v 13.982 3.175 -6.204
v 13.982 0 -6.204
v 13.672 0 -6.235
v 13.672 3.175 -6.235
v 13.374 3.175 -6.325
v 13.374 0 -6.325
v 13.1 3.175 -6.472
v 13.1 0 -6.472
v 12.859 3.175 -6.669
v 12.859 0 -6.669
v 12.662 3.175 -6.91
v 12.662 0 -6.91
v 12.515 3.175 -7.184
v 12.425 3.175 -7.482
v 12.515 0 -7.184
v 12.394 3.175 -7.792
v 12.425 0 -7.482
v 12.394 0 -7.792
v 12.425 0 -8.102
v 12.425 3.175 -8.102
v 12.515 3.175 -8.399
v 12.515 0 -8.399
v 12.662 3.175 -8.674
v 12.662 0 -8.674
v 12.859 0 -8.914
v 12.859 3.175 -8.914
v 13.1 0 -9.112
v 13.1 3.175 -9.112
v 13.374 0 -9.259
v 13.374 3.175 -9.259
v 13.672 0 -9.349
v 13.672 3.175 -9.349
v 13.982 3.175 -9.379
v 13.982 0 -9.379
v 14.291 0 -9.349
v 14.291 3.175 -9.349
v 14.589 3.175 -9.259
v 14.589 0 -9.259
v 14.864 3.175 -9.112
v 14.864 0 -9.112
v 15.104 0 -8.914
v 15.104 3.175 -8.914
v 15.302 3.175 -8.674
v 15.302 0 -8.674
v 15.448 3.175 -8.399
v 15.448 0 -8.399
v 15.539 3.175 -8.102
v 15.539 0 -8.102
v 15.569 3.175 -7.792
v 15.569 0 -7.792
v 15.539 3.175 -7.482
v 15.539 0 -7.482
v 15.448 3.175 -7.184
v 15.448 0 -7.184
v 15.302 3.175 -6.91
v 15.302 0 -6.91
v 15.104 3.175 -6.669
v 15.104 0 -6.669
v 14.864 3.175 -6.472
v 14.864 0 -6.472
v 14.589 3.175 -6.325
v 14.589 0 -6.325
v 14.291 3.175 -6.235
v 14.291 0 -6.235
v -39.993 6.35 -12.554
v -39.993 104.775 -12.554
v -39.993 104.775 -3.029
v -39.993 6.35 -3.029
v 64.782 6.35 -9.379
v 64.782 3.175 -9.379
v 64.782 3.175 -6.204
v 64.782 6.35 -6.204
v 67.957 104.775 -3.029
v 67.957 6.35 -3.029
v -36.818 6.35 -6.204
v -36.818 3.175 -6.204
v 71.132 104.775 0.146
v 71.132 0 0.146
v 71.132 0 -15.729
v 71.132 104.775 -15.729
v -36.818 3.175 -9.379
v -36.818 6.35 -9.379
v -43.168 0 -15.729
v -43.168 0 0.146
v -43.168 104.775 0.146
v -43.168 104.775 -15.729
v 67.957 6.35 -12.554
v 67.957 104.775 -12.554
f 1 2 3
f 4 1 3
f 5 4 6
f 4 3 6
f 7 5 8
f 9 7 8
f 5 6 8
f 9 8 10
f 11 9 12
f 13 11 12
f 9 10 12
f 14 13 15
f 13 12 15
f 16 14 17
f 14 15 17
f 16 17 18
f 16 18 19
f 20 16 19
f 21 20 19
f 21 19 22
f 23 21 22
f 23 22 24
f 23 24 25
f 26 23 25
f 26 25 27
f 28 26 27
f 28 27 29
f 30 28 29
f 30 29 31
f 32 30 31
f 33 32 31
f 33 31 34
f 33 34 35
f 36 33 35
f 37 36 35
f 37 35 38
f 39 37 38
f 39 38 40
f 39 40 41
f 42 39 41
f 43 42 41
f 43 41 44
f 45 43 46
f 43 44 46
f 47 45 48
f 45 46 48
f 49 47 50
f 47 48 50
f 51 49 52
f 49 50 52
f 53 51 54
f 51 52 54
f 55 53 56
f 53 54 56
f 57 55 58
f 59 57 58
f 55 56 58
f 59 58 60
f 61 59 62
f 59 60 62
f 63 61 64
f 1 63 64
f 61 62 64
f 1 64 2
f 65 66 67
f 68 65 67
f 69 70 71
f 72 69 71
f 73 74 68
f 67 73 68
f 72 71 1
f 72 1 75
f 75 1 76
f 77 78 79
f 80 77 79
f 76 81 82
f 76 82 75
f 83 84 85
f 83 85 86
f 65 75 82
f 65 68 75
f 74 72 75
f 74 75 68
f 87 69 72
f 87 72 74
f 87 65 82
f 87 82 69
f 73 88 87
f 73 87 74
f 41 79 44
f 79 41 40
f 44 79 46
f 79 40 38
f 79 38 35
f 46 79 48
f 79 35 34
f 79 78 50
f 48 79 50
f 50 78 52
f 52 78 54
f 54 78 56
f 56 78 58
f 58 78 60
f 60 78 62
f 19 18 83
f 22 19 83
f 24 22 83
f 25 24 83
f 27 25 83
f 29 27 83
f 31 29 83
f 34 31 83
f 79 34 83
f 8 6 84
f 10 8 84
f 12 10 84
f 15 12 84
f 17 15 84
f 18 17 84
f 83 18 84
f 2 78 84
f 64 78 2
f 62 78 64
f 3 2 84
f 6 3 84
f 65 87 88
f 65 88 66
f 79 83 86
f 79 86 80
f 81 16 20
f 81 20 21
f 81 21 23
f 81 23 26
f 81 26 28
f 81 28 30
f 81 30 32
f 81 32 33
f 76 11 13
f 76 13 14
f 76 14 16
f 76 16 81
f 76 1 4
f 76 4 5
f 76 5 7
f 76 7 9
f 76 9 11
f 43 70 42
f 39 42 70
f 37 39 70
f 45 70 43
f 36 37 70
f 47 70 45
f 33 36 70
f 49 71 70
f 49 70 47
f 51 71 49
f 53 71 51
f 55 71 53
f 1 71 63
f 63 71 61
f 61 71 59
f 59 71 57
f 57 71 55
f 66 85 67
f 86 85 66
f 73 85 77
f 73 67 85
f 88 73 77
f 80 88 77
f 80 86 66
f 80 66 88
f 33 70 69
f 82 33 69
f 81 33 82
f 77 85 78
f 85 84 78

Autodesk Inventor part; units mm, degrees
ref_plane "YZ Plane" through (0, 0, 0) normal (1, 0, 0) x (0, 1, 0)
ref_plane "XZ Plane" through (0, 0, 0) normal (0, 1, 0) x (-1, 0, 0)
ref_plane "XY Plane" through (0, 0, 0) normal (0, 0, 1) x (1, 0, 0)
sketch "Sketch1" plane through (0, 0, 0) normal (0, 1, 0) x (-1, 0, 0)
  line L0 (43.1683, -15.7294) -> (-71.1317, -15.7294)
  line L1 (-71.1317, -15.7294) -> (-71.1317, 0.1456)
  line L2 (-71.1317, 0.1456) -> (43.1683, 0.1456)
  line L3 (43.1683, 0.1456) -> (43.1683, -15.7294)
  point P0 (0, 0)
  dimension "d0" = 114.3
  dimension "d1" = 15.875
extrude "Extrusion1" add sketch "Sketch1" along normal blind 3.175
sketch "Sketch6" plane through (0, 3.175, 0) normal (0, 1, 0) x (1, 0, 0)
  line L0 (71.1317, 15.7294) -> (-43.1683, 15.7294) projected
  line L1 (-43.1683, 15.7294) -> (71.1317, 15.7294)
  line L2 (71.1317, 15.7294) -> (71.1317, 12.5544)
  line L3 (71.1317, 12.5544) -> (-43.1683, 12.5544)
  line L4 (-43.1683, 12.5544) -> (-43.1683, 15.7294)
  point P0 (0, 0)
  dimension "d33" = 3.175
  dimension "d34" = 114.3
extrude "Extrusion2" add sketch "Sketch6" along normal blind 101.6
sketch "Sketch9" plane through (0, 3.175, 0) normal (0, 1, 0) x (1, 0, 0)
  line L0 (-43.1683, -0.1456) -> (71.1317, -0.1456) projected
  line L1 (-43.1683, -0.1456) -> (71.1317, -0.1456)
  line L2 (71.1317, -0.1456) -> (71.1317, 3.0294)
  line L3 (71.1317, 3.0294) -> (-43.1683, 3.0294)
  line L4 (-43.1683, 3.0294) -> (-43.1683, -0.1456)
  point P0 (0, 0)
  dimension "d41" = 3.175
  dimension "d42" = 114.3
extrude "Extrusion3" add sketch "Sketch9" along normal blind 101.6
sketch "Sketch11" plane through (0, 3.175, 0) normal (0, 1, 0) x (1, 0, 0)
  line L0 (-43.1683, 12.5544) -> (71.1317, 12.5544) projected
  line L1 (-43.1683, 12.5544) -> (-39.9933, 12.5544)
  line L2 (-39.9933, 12.5544) -> (-39.9933, 3.0294)
  line L3 (-39.9933, 3.0294) -> (-43.1683, 3.0294)
  line L4 (-43.1683, 3.0294) -> (-43.1683, 12.5544)
  point P0 (0, 0)
  dimension "d45" = 3.175
  dimension "d46" = 9.525
extrude "Extrusion4" add sketch "Sketch11" along normal blind 101.6
sketch "Sketch13" plane through (0, 3.175, 0) normal (0, 1, 0) x (1, 0, 0)
  line L0 (71.1317, 12.5544) -> (-39.9933, 12.5544) projected
  line L1 (71.1317, 12.5544) -> (67.9567, 12.5544)
  line L2 (67.9567, 12.5544) -> (67.9567, 3.0294)
  line L3 (67.9567, 3.0294) -> (71.1317, 3.0294)
  line L4 (71.1317, 3.0294) -> (71.1317, 12.5544)
  point P0 (0, 0)
  dimension "d51" = 3.175
  dimension "d52" = 9.525
extrude "Extrusion5" add sketch "Sketch13" along normal blind 101.6
sketch "Sketch14" plane through (0, 3.175, 0) normal (0, 1, 0) x (1, 0, 0)
  line L0 (67.9567, 12.5544) -> (-39.9933, 12.5544) projected
  line L1 (-39.9933, 12.5544) -> (67.9567, 12.5544)
  line L2 (67.9567, 12.5544) -> (67.9567, 9.3794)
  line L3 (67.9567, 9.3794) -> (-39.9933, 9.3794)
  line L4 (-39.9933, 9.3794) -> (-39.9933, 12.5544)
  point P0 (0, 0)
  dimension "d55" = 3.175
  dimension "d56" = 107.95
extrude "Extrusion6" add sketch "Sketch14" along normal blind 3.175
sketch "Sketch15" plane through (0, 3.175, 0) normal (0, 1, 0) x (1, 0, 0)
  line L0 (67.9567, 3.0294) -> (-39.9933, 3.0294) projected
  line L1 (-39.9933, 3.0294) -> (67.9567, 3.0294)
  line L2 (67.9567, 3.0294) -> (67.9567, 6.2044)
  line L3 (67.9567, 6.2044) -> (-39.9933, 6.2044)
  line L4 (-39.9933, 6.2044) -> (-39.9933, 3.0294)
  point P0 (0, 0)
  dimension "d59" = 3.175
  dimension "d60" = 107.95
extrude "Extrusion7" add sketch "Sketch15" along normal blind 3.175
sketch "Sketch17" plane through (0, 3.175, 0) normal (0, 1, 0) x (1, 0, 0)
  line L0 (67.9567, 9.3794) -> (-39.9933, 9.3794) projected
  line L1 (-39.9933, 9.3794) -> (-36.8183, 9.3794)
  line L2 (-36.8183, 9.3794) -> (-36.8183, 6.2044)
  line L3 (-36.8183, 6.2044) -> (-39.9933, 6.2044)
  line L4 (-39.9933, 6.2044) -> (-39.9933, 9.3794)
  point P0 (0, 0)
  dimension "d64" = 3.175
  dimension "d65" = 3.175
extrude "Extrusion8" add sketch "Sketch17" along normal blind 3.175
sketch "Sketch18" plane through (0, 3.175, 0) normal (0, 1, 0) x (1, 0, 0)
  line L0 (-36.8183, 9.3794) -> (67.9567, 9.3794) projected
  line L1 (67.9567, 9.3794) -> (64.7817, 9.3794)
  line L2 (64.7817, 9.3794) -> (64.7817, 6.2044)
  line L3 (64.7817, 6.2044) -> (67.9567, 6.2044)
  line L4 (67.9567, 6.2044) -> (67.9567, 9.3794)
  point P0 (0, 0)
  dimension "d68" = 3.175
  dimension "d69" = 3.175
extrude "Extrusion9" add sketch "Sketch18" along normal blind 3.175
sketch "Sketch20" plane through (0, 104.775, 0) normal (0, 1, 0) x (1, 0, 0)
  line L0 (-43.1683, -0.1456) -> (71.1317, -0.1456) projected
  line L1 (-43.1683, -0.1456) -> (-43.1683, 7.7919)
  line L2 (-43.1683, 15.7294) -> (-43.1683, -0.1456) projected
  line L3 (-43.1683, 7.7919) -> (13.9817, 7.7919)
  point P0 (0, 0)
  dimension "d79" = 7.9375
  dimension "d80" = 57.15
hole "Hole6" at (13.9817, 104.775, -7.7919) direction (0, -1, 0) diameter 3.175 end through all
properties part number "sing_cell_bottom_case_alternate"
